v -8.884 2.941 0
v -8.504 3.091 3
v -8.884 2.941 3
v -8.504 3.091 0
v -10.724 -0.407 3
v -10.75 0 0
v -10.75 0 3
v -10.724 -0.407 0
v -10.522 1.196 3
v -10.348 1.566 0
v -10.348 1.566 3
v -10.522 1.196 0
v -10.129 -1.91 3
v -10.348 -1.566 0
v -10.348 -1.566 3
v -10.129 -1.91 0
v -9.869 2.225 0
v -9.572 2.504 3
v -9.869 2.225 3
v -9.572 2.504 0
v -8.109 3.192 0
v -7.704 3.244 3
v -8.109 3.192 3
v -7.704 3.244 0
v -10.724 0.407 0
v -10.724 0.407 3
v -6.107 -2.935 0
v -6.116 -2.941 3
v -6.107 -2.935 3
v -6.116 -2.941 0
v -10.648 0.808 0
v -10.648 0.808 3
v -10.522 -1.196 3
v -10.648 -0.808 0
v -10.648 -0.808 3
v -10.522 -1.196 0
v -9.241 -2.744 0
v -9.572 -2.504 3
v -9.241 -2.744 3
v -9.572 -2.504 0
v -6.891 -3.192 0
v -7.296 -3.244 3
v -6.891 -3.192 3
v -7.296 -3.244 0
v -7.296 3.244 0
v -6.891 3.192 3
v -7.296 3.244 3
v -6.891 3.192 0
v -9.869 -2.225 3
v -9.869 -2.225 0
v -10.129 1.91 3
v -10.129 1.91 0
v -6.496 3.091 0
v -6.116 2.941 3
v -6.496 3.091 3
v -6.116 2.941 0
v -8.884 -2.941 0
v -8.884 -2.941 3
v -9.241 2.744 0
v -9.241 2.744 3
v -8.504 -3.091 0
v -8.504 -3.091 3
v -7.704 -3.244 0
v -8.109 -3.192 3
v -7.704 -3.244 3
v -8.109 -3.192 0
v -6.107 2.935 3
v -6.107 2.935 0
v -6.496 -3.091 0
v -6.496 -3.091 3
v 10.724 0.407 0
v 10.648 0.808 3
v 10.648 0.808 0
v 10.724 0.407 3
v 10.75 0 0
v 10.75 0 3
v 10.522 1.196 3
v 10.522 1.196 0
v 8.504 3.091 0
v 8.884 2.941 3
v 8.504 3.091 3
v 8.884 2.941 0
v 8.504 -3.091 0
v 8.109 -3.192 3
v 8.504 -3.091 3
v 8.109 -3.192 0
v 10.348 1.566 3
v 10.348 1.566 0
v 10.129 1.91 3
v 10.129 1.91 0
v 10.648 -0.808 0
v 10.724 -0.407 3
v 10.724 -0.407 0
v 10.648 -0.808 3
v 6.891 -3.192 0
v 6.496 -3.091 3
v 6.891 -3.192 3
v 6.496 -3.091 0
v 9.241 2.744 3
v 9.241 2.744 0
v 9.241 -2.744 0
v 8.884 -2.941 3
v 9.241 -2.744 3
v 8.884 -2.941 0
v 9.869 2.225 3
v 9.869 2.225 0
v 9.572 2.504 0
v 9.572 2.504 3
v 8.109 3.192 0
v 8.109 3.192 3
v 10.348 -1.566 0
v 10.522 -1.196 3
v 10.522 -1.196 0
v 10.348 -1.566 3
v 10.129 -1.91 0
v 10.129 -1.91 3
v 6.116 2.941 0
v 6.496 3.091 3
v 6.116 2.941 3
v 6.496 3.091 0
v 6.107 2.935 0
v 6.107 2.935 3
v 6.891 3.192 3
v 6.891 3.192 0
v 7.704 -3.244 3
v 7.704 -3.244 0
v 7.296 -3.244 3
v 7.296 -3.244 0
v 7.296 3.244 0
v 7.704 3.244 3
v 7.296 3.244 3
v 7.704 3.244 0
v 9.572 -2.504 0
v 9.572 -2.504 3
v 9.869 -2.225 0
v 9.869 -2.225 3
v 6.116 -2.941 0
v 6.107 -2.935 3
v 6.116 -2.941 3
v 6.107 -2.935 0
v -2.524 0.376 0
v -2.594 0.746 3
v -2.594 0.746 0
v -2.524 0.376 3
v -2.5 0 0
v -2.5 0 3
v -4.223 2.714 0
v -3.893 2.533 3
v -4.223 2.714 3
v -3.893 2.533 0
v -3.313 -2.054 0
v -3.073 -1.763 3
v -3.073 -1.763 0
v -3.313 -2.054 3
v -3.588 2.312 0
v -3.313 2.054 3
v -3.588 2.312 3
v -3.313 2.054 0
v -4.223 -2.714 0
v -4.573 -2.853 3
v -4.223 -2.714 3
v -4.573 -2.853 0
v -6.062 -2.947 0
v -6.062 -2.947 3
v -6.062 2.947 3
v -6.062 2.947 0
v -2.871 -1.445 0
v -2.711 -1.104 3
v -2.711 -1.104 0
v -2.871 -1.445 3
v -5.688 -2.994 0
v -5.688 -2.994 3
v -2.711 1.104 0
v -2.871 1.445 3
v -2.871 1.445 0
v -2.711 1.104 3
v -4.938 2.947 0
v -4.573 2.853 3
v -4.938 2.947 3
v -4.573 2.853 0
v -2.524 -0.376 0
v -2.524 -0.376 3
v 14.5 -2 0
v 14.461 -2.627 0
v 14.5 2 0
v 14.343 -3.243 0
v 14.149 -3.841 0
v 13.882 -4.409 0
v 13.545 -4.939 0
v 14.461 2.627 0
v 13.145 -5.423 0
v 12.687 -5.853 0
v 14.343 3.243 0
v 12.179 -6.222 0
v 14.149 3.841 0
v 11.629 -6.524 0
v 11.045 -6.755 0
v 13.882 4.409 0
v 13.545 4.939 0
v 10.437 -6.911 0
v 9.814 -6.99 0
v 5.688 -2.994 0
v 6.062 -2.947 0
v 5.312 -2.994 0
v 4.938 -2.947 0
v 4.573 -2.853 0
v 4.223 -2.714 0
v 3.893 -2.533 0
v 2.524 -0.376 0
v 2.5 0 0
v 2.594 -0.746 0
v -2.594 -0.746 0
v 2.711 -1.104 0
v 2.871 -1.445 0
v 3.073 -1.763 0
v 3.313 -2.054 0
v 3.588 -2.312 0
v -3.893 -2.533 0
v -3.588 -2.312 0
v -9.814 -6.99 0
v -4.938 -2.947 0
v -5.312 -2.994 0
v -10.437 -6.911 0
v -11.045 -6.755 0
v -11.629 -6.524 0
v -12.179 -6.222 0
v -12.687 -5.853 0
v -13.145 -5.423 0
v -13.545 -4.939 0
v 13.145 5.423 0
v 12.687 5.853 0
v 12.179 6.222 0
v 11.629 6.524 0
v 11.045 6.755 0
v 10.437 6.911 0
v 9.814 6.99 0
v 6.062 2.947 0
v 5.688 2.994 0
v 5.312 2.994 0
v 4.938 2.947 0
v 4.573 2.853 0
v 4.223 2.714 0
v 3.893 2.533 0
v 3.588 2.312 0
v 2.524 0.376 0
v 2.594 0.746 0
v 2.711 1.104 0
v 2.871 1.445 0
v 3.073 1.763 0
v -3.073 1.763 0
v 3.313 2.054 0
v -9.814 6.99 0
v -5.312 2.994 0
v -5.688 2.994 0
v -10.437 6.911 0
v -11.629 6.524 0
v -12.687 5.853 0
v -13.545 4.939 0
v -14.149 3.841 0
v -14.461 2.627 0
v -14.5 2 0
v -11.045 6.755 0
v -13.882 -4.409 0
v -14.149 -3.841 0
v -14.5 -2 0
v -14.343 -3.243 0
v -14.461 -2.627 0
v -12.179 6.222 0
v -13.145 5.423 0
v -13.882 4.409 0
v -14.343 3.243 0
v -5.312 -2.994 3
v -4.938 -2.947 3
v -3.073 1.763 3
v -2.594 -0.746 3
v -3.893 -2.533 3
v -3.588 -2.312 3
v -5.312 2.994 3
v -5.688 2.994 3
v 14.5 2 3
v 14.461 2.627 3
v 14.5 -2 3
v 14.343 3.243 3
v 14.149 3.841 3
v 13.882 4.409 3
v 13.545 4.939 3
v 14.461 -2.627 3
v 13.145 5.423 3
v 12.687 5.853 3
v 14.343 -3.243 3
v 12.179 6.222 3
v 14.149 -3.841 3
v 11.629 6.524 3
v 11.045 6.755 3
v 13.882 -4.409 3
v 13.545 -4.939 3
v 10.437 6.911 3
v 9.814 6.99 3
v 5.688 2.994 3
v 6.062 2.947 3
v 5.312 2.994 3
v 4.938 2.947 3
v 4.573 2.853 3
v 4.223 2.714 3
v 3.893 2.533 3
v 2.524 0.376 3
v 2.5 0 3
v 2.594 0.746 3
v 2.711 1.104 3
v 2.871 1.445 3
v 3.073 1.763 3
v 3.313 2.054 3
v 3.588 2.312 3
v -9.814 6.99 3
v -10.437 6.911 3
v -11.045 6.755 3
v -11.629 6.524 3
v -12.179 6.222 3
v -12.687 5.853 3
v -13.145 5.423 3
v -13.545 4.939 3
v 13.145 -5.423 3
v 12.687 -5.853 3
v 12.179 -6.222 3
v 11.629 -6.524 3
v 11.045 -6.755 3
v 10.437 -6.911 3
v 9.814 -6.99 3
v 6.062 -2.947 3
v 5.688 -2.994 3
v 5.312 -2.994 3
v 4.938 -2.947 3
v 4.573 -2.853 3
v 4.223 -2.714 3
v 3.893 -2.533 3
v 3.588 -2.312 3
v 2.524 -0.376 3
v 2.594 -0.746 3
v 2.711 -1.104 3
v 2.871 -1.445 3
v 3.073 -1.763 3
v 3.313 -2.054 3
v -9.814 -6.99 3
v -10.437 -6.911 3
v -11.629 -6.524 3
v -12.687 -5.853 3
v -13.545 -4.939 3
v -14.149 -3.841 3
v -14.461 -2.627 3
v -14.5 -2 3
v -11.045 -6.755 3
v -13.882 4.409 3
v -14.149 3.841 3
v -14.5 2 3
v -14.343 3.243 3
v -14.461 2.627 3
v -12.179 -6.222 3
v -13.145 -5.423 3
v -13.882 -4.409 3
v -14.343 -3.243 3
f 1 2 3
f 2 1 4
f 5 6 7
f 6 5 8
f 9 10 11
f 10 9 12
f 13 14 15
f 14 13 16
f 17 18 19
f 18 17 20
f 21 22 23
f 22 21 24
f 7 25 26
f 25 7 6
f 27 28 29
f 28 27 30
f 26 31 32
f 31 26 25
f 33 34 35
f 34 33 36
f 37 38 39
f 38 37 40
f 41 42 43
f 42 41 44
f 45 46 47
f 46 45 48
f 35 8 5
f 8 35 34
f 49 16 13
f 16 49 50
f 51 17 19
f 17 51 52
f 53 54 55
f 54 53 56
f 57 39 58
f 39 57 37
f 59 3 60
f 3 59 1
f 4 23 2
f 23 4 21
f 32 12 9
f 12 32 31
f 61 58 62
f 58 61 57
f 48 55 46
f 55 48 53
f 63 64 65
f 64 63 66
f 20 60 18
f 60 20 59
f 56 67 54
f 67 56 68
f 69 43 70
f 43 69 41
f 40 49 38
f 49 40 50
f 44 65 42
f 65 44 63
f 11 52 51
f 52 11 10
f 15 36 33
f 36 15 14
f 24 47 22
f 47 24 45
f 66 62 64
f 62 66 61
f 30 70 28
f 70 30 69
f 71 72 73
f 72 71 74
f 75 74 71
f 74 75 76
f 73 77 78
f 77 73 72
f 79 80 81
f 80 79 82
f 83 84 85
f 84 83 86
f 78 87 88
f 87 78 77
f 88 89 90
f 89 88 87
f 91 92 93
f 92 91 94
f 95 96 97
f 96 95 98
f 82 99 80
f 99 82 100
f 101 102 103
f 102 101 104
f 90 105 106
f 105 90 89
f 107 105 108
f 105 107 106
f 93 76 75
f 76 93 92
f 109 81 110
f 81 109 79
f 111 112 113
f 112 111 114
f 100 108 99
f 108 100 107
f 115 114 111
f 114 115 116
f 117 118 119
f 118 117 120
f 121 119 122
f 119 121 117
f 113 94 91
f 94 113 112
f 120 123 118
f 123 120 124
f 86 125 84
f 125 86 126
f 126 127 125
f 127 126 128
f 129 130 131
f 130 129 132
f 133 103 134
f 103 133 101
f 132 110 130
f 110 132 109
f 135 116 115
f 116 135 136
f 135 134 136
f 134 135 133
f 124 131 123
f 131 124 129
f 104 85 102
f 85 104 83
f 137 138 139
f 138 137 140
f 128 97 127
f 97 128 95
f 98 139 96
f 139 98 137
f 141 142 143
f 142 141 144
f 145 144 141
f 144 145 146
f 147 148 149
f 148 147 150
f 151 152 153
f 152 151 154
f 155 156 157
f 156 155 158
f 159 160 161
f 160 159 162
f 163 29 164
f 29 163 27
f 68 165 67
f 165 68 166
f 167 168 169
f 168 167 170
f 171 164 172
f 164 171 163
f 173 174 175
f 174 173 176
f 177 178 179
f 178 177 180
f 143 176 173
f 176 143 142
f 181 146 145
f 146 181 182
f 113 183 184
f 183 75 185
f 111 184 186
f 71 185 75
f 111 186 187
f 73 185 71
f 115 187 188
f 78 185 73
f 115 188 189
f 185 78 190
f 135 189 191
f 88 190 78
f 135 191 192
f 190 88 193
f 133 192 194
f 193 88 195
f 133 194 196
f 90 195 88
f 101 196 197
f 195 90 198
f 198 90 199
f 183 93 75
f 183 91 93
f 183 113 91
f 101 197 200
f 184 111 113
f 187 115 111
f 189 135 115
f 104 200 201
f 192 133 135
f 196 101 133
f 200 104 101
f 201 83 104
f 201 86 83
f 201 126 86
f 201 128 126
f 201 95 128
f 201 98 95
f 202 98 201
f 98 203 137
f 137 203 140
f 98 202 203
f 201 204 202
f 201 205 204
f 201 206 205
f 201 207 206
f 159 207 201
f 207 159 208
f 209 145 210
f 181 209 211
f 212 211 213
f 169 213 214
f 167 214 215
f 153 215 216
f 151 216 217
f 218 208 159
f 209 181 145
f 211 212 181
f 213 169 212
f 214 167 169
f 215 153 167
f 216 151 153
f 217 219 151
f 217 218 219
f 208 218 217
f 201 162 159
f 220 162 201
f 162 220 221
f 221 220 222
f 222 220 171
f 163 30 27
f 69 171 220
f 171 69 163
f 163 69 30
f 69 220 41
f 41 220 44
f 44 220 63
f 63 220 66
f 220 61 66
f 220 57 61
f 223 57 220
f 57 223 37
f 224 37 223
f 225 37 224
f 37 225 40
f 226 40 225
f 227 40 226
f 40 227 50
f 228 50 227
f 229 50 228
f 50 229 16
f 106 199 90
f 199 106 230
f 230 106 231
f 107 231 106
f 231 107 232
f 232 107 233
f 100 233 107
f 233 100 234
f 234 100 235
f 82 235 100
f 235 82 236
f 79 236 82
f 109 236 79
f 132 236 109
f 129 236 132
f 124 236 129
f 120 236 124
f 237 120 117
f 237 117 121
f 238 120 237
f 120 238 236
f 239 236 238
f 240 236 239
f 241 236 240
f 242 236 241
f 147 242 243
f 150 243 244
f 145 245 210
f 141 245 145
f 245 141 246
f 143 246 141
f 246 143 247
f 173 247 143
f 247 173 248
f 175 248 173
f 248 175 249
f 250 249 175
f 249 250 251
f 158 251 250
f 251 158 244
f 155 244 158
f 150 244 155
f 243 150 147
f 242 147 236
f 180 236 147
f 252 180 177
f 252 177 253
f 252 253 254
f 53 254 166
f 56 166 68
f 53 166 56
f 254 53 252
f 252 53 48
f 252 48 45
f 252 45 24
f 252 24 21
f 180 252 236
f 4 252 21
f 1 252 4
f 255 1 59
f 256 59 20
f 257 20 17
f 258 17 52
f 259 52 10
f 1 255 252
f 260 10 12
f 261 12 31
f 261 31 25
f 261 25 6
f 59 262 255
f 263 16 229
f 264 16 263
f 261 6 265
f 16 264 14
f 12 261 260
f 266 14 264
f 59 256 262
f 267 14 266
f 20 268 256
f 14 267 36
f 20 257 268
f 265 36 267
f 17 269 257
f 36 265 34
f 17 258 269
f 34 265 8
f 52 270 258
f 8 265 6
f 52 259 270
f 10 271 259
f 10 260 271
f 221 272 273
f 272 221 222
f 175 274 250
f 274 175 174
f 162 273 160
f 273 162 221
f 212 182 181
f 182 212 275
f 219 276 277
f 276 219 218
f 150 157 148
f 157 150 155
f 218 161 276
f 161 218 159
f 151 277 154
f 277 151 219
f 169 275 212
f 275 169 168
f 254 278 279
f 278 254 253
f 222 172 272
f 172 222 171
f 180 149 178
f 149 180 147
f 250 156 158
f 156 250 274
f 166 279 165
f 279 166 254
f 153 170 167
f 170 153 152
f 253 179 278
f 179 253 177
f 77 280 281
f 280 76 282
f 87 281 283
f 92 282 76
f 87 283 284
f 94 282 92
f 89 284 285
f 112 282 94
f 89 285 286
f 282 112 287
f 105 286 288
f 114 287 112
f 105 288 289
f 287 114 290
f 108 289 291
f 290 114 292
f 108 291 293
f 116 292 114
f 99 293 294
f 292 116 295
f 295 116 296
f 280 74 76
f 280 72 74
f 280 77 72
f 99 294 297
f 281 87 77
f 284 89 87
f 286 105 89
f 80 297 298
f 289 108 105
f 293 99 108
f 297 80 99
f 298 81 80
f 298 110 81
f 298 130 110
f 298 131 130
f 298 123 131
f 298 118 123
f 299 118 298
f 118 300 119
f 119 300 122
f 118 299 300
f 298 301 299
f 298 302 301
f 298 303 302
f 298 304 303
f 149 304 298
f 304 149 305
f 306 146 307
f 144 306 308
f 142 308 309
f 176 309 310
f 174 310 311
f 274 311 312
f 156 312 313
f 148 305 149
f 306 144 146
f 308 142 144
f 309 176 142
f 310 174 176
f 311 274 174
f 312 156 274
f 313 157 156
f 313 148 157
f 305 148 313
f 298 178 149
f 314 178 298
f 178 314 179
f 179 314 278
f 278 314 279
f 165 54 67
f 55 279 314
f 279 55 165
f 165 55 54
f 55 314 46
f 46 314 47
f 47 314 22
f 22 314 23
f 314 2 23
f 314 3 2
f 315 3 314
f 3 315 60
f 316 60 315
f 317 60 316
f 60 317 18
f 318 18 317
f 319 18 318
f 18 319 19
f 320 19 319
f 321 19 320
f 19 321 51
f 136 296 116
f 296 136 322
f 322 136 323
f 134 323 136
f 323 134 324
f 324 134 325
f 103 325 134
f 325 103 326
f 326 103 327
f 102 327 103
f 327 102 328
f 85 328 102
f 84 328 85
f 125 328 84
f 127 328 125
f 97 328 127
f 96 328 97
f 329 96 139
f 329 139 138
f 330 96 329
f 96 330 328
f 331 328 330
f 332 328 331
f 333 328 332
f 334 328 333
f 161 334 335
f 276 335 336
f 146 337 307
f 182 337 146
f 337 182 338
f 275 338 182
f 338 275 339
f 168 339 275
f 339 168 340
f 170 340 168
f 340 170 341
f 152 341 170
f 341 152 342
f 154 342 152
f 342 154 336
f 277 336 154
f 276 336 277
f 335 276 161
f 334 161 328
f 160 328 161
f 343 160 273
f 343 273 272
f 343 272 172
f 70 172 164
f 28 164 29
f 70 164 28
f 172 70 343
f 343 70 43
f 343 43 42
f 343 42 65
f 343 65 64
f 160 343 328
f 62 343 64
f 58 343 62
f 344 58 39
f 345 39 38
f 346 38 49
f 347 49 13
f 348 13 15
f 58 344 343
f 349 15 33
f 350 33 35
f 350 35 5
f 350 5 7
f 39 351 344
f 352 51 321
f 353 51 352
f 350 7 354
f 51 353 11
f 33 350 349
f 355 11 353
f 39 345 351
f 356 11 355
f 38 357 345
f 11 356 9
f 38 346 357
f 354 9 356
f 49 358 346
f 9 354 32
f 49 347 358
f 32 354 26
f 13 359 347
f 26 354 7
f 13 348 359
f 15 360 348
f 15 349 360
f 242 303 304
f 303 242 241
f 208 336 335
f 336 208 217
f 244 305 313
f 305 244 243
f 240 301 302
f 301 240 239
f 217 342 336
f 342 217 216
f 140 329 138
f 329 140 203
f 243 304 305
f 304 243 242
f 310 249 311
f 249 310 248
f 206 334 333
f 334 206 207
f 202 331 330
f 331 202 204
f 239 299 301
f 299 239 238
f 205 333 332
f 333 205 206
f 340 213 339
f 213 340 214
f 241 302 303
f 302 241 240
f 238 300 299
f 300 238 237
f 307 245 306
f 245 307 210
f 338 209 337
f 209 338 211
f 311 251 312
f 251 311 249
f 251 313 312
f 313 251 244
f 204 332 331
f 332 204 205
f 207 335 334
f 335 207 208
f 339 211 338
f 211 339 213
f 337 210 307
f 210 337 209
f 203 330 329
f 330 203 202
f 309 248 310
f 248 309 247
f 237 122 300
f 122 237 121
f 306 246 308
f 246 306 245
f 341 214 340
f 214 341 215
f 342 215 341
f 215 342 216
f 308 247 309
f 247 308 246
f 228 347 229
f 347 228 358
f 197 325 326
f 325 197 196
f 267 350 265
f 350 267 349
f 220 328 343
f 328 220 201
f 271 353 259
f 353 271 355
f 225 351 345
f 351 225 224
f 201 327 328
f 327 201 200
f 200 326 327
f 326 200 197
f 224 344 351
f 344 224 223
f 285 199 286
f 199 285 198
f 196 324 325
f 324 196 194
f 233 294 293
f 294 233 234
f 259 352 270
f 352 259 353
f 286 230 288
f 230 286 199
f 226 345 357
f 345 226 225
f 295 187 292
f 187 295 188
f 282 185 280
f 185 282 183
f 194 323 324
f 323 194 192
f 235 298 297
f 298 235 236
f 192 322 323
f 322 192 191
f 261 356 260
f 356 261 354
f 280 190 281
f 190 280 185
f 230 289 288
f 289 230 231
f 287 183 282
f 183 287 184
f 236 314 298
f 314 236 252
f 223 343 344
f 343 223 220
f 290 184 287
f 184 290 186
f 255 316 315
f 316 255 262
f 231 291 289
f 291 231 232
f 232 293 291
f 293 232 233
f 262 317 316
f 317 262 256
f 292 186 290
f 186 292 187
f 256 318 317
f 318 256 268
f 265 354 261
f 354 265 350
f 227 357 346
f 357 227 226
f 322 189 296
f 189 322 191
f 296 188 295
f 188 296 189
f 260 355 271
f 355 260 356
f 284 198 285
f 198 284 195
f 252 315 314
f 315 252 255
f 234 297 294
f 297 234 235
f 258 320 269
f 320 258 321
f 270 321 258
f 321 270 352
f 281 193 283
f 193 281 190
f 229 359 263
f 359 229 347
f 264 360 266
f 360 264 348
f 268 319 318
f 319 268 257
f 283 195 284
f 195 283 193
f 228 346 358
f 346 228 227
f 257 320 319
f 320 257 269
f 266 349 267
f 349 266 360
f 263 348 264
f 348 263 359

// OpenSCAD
$fn = 50;


difference() {
	union() {
		hull() {
			translate(v = [-9.5000000000, 2.0000000000, 0]) {
				cylinder(h = 3, r = 5);
			}
			translate(v = [9.5000000000, 2.0000000000, 0]) {
				cylinder(h = 3, r = 5);
			}
			translate(v = [-9.5000000000, -2.0000000000, 0]) {
				cylinder(h = 3, r = 5);
			}
			translate(v = [9.5000000000, -2.0000000000, 0]) {
				cylinder(h = 3, r = 5);
			}
		}
	}
	union() {
		#translate(v = [-7.5000000000, 0.0000000000, -100.0000000000]) {
			cylinder(h = 200, r = 3.2500000000);
		}
		#translate(v = [-7.5000000000, 0.0000000000, -100.0000000000]) {
			cylinder(h = 200, r = 3.2500000000);
		}
		#translate(v = [7.5000000000, 0.0000000000, -100.0000000000]) {
			cylinder(h = 200, r = 3.2500000000);
		}
		#translate(v = [7.5000000000, 0.0000000000, -100.0000000000]) {
			cylinder(h = 200, r = 3.2500000000);
		}
		#translate(v = [-5.5000000000, 0, 0]) {
			cylinder(h = 3, r = 3.0000000000);
		}
		#translate(v = [5.5000000000, 0, 0]) {
			cylinder(h = 3, r = 3.0000000000);
		}
	}
}
